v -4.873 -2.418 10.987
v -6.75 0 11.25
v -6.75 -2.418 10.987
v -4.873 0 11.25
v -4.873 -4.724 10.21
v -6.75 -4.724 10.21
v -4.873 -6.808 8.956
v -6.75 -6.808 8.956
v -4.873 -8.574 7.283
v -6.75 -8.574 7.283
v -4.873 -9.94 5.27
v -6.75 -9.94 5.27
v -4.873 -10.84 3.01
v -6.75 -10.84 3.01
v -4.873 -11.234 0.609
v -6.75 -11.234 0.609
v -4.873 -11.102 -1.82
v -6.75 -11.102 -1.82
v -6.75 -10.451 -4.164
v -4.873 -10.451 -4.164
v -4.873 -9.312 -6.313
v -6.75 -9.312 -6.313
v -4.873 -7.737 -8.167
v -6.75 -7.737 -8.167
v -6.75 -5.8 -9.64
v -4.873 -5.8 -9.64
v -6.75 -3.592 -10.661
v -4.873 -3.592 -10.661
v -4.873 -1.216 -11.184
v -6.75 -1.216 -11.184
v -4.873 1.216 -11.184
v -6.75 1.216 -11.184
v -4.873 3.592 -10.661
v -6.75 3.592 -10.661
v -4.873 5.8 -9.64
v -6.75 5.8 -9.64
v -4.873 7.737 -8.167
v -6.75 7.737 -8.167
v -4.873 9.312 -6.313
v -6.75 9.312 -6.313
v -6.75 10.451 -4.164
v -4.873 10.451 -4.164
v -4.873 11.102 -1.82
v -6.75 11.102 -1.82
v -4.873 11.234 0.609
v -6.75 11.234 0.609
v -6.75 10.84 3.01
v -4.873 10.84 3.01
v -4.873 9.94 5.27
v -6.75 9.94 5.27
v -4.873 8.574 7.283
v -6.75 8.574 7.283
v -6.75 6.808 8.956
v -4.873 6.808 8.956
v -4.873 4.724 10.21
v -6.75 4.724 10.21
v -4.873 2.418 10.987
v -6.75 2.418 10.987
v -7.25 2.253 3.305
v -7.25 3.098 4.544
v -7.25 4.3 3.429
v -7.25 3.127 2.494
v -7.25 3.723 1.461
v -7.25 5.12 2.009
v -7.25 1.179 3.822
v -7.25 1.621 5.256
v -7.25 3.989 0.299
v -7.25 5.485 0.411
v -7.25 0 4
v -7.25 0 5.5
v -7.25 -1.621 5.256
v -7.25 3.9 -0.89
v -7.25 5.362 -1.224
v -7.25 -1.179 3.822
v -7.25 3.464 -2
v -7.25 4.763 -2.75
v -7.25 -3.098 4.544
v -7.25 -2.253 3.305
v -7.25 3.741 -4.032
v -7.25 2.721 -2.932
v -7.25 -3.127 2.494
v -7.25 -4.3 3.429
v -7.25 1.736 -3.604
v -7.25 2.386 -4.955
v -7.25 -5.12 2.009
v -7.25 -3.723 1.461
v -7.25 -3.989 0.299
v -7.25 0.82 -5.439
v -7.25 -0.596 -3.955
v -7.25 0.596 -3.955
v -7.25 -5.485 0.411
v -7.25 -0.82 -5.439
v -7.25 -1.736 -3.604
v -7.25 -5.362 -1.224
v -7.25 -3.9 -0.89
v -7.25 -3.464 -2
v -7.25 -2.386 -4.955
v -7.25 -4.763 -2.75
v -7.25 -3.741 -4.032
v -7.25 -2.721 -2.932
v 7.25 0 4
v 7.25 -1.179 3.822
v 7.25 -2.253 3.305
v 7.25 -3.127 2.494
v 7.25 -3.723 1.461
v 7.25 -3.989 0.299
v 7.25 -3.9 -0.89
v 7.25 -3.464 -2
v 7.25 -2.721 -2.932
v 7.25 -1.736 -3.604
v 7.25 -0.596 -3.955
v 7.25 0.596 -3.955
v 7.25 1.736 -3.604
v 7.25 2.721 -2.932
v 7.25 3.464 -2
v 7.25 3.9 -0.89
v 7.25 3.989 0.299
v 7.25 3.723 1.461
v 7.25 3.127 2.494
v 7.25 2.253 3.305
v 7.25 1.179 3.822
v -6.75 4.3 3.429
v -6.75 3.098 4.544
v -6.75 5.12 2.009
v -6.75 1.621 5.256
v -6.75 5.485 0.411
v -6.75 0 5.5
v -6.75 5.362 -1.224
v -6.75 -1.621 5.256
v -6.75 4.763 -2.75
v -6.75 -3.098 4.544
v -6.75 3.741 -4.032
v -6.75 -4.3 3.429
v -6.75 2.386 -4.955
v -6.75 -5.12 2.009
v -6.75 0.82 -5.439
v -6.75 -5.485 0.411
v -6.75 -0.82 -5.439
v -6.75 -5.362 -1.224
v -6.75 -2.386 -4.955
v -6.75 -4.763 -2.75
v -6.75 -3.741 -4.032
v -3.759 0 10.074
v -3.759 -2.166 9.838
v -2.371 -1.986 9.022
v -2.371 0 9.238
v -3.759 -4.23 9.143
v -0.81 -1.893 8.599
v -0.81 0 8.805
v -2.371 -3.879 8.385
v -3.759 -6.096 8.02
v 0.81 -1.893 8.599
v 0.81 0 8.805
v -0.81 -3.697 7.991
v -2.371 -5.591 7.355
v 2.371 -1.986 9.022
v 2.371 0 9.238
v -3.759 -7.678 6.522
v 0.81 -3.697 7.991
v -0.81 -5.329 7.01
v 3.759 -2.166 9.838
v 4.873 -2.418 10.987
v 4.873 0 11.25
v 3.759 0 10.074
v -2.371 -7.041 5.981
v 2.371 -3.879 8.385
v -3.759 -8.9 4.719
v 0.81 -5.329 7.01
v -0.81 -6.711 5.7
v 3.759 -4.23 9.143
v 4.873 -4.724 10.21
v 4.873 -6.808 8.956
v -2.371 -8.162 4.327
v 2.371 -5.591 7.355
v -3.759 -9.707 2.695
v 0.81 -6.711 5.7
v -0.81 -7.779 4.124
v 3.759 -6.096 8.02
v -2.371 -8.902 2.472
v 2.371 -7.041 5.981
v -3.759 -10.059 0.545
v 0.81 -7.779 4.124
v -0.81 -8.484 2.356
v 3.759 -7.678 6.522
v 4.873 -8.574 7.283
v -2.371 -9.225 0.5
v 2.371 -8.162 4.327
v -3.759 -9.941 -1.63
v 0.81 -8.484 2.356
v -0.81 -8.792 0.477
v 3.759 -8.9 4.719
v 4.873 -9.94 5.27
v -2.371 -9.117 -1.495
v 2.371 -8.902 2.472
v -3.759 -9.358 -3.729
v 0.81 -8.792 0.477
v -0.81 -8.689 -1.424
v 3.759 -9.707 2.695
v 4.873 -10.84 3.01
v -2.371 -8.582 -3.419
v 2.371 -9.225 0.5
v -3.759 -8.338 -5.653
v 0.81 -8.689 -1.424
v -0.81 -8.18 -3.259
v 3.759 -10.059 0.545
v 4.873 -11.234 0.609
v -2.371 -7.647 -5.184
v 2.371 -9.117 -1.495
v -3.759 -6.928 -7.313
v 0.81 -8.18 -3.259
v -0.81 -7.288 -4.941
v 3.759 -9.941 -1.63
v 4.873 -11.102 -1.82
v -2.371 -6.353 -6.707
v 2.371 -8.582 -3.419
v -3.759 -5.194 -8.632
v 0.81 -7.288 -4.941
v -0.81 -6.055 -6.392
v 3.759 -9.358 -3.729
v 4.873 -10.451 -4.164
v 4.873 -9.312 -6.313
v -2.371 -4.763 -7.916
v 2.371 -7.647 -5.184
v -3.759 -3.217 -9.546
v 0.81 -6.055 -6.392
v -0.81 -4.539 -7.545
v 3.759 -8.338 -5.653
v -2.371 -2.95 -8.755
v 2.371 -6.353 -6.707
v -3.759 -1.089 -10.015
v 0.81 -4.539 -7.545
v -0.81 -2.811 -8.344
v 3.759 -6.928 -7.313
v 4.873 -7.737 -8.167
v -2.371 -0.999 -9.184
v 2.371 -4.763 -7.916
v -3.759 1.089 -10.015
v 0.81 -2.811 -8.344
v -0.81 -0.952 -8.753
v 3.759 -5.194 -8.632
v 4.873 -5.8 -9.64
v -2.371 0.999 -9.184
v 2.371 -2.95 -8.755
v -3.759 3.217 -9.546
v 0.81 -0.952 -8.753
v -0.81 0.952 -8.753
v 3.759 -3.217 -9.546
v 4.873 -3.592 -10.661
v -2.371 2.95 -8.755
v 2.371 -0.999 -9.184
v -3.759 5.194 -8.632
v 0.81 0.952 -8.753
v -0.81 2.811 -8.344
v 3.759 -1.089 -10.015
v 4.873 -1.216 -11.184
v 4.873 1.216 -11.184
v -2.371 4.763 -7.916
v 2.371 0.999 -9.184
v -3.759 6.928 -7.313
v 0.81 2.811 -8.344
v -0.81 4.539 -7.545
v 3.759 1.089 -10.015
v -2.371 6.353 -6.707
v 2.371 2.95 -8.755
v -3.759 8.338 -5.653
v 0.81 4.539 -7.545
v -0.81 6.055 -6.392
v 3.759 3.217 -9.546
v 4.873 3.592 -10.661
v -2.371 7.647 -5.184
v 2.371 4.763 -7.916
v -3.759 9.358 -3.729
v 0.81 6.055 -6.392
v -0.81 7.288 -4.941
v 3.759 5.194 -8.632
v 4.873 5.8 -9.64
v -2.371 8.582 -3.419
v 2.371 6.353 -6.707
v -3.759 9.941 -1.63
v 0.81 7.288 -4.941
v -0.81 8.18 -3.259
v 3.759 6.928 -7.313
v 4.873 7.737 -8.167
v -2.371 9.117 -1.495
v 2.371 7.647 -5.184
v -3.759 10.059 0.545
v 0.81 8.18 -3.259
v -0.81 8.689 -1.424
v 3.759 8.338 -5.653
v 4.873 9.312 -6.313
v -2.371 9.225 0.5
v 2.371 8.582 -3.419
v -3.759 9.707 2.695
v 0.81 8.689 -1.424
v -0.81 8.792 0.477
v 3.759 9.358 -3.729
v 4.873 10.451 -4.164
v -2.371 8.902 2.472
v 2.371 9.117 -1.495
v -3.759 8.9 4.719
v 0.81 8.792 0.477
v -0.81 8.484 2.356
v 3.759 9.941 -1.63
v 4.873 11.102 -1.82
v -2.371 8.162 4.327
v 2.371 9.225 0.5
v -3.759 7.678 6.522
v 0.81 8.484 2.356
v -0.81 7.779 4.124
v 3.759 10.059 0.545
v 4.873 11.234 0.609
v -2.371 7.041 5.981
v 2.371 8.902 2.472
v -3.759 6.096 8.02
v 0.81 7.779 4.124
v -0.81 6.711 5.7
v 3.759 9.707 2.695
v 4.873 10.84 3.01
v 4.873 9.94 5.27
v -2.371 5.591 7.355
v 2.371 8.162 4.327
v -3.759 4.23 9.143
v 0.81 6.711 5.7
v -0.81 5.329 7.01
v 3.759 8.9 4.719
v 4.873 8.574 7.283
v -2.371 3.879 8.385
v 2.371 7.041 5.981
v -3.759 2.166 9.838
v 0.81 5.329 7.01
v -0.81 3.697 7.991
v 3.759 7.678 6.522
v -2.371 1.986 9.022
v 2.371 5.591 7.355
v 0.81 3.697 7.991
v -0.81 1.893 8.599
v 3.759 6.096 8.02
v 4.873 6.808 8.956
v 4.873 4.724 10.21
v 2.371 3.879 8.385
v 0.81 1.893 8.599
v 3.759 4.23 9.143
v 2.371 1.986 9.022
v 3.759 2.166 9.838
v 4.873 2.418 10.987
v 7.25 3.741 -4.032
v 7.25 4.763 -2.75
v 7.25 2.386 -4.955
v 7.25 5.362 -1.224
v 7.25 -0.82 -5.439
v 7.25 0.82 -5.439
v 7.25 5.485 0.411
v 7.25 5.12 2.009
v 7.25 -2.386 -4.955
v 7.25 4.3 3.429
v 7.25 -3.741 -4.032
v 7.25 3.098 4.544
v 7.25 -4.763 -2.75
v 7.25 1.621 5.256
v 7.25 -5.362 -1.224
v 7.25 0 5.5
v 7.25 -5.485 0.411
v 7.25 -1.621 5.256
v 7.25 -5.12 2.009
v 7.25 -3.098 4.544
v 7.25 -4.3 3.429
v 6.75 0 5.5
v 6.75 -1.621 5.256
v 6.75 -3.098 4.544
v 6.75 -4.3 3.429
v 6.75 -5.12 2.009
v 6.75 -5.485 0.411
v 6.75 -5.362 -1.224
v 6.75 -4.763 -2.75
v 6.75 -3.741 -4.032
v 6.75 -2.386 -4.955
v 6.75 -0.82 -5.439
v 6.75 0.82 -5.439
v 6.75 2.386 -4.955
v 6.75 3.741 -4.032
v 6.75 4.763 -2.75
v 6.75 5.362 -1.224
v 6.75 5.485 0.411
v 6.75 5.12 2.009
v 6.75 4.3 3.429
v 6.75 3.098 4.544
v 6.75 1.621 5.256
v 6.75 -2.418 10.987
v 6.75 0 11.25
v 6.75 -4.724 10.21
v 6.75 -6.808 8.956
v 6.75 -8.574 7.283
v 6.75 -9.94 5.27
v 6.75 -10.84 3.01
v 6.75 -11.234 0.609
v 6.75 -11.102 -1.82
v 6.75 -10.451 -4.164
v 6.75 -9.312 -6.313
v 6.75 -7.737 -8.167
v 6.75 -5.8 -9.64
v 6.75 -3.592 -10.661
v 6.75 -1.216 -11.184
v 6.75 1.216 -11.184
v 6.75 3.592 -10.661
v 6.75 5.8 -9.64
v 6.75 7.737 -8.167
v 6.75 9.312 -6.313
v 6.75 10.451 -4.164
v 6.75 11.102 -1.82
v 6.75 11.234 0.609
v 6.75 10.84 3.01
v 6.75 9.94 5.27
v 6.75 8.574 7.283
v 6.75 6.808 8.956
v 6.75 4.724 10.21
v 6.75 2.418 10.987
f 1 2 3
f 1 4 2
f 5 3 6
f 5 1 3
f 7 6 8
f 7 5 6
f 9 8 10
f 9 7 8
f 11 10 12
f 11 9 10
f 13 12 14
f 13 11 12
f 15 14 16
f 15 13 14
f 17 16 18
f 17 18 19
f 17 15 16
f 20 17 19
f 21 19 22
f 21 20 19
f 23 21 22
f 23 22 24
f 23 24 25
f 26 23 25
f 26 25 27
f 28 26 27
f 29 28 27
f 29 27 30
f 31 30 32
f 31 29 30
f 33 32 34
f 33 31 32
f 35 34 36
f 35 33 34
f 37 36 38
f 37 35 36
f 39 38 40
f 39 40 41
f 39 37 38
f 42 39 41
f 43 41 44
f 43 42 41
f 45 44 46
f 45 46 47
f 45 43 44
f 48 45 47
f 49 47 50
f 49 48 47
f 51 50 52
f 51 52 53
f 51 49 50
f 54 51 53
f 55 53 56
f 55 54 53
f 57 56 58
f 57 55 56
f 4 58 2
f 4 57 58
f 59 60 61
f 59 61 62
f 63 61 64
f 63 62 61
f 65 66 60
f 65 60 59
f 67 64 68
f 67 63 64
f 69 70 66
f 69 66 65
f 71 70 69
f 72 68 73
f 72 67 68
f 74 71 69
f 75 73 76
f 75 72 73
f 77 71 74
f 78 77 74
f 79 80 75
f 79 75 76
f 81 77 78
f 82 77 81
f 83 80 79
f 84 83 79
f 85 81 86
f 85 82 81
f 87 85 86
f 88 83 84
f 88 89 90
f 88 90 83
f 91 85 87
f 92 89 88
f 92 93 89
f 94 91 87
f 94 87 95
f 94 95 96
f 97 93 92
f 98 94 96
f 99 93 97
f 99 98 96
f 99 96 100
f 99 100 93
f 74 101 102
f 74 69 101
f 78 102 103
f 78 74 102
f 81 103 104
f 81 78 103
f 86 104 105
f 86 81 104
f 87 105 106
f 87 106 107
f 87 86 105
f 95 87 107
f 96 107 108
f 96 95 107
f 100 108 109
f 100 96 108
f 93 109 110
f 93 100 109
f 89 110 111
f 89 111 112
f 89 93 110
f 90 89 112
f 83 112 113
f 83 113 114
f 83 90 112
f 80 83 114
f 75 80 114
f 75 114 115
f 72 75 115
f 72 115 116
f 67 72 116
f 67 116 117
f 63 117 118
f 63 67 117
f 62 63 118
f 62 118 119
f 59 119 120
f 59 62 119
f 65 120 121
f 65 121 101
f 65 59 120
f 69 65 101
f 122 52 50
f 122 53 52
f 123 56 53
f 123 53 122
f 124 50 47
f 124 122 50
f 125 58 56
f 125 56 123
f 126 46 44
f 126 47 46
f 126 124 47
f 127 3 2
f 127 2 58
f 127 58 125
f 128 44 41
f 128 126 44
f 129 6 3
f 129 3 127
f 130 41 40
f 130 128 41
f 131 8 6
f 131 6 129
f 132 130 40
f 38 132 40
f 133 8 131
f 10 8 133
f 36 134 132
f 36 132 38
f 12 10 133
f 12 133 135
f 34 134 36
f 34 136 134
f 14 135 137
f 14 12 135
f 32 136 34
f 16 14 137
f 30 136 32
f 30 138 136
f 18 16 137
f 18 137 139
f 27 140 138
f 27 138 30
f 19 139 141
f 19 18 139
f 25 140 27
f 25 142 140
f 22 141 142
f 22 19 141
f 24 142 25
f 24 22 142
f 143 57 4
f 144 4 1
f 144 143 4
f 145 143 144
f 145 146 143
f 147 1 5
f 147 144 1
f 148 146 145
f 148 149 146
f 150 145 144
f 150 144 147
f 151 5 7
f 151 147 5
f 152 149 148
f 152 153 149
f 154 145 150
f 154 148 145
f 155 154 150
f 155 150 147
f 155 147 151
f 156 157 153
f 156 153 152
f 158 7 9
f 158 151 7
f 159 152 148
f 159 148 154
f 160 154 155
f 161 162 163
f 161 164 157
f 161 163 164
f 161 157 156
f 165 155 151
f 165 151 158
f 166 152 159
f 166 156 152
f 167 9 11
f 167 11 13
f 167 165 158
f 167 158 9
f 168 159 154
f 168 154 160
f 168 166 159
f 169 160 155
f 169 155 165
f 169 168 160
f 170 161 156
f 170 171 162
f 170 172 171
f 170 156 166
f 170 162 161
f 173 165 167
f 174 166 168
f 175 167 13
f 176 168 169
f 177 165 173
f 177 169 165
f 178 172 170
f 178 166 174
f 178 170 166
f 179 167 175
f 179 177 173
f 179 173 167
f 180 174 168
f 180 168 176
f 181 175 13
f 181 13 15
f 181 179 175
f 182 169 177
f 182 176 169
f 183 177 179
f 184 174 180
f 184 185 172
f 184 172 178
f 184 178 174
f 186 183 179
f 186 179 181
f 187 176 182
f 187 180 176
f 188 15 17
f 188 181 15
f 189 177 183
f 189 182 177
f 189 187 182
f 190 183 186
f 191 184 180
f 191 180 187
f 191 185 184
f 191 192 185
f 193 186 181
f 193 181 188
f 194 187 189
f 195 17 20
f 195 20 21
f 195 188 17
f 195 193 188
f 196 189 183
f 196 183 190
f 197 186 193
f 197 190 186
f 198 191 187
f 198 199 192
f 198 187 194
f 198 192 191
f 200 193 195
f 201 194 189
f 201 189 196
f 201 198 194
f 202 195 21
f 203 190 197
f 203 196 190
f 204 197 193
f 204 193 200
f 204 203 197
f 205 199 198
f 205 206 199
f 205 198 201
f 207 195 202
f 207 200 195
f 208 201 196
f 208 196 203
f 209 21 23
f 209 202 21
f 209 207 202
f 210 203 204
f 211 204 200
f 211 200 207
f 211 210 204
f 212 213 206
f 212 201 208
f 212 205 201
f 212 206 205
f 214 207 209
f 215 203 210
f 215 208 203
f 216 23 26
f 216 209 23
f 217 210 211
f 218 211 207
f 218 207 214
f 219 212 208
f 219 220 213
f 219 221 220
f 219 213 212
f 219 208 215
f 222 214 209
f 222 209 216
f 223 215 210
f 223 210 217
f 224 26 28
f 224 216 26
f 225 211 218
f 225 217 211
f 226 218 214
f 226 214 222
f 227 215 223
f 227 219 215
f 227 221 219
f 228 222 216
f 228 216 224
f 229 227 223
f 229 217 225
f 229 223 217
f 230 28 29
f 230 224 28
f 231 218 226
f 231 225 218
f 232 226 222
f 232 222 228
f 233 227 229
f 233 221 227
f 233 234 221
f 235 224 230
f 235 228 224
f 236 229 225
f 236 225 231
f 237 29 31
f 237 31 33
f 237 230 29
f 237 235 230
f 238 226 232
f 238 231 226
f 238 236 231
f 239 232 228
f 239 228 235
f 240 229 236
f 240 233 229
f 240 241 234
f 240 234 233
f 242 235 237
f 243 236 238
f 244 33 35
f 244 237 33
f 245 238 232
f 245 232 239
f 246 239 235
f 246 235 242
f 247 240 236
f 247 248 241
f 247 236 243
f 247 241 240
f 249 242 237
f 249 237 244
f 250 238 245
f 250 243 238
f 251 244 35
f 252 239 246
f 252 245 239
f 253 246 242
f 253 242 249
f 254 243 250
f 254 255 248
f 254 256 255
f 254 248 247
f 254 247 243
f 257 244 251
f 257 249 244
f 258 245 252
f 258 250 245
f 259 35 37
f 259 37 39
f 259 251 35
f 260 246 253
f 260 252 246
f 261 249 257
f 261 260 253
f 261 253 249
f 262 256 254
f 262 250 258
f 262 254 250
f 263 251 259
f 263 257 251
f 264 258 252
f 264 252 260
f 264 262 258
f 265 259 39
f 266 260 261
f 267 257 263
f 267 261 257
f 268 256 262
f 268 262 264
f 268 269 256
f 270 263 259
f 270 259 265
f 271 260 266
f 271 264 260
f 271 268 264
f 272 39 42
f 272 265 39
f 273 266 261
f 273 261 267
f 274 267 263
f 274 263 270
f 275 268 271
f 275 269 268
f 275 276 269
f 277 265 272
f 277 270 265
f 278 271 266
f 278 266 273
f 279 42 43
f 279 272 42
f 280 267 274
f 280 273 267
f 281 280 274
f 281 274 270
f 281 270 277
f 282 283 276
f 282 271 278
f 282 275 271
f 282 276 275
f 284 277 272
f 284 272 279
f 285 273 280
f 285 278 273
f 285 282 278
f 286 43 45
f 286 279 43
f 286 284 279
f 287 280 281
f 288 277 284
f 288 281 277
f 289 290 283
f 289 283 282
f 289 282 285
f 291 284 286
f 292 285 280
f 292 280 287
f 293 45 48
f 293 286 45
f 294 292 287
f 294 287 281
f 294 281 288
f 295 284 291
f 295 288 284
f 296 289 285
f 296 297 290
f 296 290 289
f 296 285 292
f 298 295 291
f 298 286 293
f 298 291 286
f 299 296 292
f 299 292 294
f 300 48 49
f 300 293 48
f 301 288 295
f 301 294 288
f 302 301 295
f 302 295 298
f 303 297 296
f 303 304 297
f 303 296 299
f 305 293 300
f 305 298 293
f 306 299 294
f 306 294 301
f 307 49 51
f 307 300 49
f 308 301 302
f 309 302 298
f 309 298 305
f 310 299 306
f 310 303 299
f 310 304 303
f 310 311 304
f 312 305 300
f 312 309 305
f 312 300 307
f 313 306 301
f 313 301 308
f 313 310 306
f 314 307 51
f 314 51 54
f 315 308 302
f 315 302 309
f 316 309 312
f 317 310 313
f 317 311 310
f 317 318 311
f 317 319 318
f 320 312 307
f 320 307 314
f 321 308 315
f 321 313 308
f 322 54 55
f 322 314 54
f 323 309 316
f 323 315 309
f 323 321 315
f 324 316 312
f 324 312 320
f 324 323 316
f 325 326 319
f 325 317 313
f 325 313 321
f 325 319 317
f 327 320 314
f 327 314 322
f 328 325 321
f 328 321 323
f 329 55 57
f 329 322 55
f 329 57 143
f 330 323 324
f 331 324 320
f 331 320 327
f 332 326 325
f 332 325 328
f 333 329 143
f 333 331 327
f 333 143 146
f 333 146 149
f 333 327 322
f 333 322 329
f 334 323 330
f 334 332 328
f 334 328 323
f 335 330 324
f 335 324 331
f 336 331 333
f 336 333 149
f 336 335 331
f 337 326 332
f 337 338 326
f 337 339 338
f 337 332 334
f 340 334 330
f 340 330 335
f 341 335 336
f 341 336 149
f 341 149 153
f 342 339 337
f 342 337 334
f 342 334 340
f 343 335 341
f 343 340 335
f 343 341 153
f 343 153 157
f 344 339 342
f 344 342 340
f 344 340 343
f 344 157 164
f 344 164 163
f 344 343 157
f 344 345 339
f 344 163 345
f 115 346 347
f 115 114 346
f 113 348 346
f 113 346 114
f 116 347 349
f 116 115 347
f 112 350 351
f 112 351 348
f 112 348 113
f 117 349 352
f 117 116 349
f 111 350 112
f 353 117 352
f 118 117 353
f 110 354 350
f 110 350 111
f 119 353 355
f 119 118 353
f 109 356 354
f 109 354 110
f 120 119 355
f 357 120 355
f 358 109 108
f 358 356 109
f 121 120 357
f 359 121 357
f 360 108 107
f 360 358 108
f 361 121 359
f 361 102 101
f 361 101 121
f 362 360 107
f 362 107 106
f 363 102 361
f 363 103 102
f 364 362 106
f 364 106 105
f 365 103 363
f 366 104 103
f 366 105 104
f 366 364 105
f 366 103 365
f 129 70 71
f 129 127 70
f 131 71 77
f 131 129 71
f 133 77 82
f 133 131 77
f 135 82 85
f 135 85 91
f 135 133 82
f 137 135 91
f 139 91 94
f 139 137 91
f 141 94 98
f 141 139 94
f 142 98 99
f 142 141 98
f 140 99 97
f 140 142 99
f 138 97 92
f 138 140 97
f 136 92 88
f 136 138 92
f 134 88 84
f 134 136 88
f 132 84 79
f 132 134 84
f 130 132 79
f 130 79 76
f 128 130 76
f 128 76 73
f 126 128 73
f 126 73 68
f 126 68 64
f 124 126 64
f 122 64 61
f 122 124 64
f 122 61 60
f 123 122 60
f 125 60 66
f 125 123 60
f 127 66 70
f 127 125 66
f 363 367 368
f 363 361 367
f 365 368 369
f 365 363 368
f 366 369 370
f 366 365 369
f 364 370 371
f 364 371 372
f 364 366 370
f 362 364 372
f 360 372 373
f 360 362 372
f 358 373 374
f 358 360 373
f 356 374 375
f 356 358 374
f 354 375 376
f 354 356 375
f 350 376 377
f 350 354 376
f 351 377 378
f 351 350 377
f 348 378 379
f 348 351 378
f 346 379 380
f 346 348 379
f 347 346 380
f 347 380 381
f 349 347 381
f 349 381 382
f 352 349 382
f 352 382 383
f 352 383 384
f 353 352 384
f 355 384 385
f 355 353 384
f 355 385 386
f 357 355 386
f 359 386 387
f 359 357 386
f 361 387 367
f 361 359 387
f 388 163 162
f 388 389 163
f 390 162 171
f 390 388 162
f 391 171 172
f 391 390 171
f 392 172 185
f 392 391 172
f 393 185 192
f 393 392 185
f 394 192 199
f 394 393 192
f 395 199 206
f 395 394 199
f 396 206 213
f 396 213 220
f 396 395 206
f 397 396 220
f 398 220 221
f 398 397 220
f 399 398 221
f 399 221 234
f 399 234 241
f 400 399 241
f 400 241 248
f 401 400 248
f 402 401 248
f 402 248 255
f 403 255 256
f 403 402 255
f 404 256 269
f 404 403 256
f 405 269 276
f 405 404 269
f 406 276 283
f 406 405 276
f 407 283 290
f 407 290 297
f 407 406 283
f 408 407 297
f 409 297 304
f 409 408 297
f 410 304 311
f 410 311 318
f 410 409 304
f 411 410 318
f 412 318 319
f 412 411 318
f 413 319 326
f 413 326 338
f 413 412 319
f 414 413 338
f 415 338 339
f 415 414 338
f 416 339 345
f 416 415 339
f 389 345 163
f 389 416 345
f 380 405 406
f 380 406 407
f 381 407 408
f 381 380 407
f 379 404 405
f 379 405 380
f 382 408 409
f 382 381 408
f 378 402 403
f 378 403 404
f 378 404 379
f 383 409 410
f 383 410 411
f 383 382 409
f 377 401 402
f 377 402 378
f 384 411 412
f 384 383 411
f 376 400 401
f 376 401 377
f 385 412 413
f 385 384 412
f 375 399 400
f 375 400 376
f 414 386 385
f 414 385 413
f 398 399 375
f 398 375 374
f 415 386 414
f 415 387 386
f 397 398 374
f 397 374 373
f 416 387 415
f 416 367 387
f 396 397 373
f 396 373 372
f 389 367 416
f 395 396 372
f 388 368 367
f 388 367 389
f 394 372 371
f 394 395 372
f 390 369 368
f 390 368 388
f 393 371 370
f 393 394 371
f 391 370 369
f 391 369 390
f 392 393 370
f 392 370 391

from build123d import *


with BuildPart() as part:
    # Sketch1 → Revolve1 (revolve)
    with BuildSketch(Plane.XY, mode=Mode.PRIVATE) as revolve1_sk:
        with BuildLine():
            ThreePointArc((-4.873397172, 11.25), (0, 8.75), (4.873397172, 11.25))
            Line((4.873397172, 11.25), (6.75, 11.25))
            Line((6.75, 11.25), (6.75, 5.5))
            Line((6.75, 5.5), (7.25, 5.5))
            Line((7.25, 5.5), (7.25, 4))
            Line((7.25, 4), (-7.25, 4))
            Line((-7.25, 4), (-7.25, 5.5))
            Line((-7.25, 5.5), (-6.75, 5.5))
            Line((-6.75, 5.5), (-6.75, 11.25))
            Line((-6.75, 11.25), (-4.873397172, 11.25))
        make_face()
    revolve(revolve1_sk.sketch.rotate(Axis((-7.25, 0, 0), (1, 0, 0)), 90), axis=Axis((-7.25, 0, 0), (1, 0, 0)))


solid = part.part
